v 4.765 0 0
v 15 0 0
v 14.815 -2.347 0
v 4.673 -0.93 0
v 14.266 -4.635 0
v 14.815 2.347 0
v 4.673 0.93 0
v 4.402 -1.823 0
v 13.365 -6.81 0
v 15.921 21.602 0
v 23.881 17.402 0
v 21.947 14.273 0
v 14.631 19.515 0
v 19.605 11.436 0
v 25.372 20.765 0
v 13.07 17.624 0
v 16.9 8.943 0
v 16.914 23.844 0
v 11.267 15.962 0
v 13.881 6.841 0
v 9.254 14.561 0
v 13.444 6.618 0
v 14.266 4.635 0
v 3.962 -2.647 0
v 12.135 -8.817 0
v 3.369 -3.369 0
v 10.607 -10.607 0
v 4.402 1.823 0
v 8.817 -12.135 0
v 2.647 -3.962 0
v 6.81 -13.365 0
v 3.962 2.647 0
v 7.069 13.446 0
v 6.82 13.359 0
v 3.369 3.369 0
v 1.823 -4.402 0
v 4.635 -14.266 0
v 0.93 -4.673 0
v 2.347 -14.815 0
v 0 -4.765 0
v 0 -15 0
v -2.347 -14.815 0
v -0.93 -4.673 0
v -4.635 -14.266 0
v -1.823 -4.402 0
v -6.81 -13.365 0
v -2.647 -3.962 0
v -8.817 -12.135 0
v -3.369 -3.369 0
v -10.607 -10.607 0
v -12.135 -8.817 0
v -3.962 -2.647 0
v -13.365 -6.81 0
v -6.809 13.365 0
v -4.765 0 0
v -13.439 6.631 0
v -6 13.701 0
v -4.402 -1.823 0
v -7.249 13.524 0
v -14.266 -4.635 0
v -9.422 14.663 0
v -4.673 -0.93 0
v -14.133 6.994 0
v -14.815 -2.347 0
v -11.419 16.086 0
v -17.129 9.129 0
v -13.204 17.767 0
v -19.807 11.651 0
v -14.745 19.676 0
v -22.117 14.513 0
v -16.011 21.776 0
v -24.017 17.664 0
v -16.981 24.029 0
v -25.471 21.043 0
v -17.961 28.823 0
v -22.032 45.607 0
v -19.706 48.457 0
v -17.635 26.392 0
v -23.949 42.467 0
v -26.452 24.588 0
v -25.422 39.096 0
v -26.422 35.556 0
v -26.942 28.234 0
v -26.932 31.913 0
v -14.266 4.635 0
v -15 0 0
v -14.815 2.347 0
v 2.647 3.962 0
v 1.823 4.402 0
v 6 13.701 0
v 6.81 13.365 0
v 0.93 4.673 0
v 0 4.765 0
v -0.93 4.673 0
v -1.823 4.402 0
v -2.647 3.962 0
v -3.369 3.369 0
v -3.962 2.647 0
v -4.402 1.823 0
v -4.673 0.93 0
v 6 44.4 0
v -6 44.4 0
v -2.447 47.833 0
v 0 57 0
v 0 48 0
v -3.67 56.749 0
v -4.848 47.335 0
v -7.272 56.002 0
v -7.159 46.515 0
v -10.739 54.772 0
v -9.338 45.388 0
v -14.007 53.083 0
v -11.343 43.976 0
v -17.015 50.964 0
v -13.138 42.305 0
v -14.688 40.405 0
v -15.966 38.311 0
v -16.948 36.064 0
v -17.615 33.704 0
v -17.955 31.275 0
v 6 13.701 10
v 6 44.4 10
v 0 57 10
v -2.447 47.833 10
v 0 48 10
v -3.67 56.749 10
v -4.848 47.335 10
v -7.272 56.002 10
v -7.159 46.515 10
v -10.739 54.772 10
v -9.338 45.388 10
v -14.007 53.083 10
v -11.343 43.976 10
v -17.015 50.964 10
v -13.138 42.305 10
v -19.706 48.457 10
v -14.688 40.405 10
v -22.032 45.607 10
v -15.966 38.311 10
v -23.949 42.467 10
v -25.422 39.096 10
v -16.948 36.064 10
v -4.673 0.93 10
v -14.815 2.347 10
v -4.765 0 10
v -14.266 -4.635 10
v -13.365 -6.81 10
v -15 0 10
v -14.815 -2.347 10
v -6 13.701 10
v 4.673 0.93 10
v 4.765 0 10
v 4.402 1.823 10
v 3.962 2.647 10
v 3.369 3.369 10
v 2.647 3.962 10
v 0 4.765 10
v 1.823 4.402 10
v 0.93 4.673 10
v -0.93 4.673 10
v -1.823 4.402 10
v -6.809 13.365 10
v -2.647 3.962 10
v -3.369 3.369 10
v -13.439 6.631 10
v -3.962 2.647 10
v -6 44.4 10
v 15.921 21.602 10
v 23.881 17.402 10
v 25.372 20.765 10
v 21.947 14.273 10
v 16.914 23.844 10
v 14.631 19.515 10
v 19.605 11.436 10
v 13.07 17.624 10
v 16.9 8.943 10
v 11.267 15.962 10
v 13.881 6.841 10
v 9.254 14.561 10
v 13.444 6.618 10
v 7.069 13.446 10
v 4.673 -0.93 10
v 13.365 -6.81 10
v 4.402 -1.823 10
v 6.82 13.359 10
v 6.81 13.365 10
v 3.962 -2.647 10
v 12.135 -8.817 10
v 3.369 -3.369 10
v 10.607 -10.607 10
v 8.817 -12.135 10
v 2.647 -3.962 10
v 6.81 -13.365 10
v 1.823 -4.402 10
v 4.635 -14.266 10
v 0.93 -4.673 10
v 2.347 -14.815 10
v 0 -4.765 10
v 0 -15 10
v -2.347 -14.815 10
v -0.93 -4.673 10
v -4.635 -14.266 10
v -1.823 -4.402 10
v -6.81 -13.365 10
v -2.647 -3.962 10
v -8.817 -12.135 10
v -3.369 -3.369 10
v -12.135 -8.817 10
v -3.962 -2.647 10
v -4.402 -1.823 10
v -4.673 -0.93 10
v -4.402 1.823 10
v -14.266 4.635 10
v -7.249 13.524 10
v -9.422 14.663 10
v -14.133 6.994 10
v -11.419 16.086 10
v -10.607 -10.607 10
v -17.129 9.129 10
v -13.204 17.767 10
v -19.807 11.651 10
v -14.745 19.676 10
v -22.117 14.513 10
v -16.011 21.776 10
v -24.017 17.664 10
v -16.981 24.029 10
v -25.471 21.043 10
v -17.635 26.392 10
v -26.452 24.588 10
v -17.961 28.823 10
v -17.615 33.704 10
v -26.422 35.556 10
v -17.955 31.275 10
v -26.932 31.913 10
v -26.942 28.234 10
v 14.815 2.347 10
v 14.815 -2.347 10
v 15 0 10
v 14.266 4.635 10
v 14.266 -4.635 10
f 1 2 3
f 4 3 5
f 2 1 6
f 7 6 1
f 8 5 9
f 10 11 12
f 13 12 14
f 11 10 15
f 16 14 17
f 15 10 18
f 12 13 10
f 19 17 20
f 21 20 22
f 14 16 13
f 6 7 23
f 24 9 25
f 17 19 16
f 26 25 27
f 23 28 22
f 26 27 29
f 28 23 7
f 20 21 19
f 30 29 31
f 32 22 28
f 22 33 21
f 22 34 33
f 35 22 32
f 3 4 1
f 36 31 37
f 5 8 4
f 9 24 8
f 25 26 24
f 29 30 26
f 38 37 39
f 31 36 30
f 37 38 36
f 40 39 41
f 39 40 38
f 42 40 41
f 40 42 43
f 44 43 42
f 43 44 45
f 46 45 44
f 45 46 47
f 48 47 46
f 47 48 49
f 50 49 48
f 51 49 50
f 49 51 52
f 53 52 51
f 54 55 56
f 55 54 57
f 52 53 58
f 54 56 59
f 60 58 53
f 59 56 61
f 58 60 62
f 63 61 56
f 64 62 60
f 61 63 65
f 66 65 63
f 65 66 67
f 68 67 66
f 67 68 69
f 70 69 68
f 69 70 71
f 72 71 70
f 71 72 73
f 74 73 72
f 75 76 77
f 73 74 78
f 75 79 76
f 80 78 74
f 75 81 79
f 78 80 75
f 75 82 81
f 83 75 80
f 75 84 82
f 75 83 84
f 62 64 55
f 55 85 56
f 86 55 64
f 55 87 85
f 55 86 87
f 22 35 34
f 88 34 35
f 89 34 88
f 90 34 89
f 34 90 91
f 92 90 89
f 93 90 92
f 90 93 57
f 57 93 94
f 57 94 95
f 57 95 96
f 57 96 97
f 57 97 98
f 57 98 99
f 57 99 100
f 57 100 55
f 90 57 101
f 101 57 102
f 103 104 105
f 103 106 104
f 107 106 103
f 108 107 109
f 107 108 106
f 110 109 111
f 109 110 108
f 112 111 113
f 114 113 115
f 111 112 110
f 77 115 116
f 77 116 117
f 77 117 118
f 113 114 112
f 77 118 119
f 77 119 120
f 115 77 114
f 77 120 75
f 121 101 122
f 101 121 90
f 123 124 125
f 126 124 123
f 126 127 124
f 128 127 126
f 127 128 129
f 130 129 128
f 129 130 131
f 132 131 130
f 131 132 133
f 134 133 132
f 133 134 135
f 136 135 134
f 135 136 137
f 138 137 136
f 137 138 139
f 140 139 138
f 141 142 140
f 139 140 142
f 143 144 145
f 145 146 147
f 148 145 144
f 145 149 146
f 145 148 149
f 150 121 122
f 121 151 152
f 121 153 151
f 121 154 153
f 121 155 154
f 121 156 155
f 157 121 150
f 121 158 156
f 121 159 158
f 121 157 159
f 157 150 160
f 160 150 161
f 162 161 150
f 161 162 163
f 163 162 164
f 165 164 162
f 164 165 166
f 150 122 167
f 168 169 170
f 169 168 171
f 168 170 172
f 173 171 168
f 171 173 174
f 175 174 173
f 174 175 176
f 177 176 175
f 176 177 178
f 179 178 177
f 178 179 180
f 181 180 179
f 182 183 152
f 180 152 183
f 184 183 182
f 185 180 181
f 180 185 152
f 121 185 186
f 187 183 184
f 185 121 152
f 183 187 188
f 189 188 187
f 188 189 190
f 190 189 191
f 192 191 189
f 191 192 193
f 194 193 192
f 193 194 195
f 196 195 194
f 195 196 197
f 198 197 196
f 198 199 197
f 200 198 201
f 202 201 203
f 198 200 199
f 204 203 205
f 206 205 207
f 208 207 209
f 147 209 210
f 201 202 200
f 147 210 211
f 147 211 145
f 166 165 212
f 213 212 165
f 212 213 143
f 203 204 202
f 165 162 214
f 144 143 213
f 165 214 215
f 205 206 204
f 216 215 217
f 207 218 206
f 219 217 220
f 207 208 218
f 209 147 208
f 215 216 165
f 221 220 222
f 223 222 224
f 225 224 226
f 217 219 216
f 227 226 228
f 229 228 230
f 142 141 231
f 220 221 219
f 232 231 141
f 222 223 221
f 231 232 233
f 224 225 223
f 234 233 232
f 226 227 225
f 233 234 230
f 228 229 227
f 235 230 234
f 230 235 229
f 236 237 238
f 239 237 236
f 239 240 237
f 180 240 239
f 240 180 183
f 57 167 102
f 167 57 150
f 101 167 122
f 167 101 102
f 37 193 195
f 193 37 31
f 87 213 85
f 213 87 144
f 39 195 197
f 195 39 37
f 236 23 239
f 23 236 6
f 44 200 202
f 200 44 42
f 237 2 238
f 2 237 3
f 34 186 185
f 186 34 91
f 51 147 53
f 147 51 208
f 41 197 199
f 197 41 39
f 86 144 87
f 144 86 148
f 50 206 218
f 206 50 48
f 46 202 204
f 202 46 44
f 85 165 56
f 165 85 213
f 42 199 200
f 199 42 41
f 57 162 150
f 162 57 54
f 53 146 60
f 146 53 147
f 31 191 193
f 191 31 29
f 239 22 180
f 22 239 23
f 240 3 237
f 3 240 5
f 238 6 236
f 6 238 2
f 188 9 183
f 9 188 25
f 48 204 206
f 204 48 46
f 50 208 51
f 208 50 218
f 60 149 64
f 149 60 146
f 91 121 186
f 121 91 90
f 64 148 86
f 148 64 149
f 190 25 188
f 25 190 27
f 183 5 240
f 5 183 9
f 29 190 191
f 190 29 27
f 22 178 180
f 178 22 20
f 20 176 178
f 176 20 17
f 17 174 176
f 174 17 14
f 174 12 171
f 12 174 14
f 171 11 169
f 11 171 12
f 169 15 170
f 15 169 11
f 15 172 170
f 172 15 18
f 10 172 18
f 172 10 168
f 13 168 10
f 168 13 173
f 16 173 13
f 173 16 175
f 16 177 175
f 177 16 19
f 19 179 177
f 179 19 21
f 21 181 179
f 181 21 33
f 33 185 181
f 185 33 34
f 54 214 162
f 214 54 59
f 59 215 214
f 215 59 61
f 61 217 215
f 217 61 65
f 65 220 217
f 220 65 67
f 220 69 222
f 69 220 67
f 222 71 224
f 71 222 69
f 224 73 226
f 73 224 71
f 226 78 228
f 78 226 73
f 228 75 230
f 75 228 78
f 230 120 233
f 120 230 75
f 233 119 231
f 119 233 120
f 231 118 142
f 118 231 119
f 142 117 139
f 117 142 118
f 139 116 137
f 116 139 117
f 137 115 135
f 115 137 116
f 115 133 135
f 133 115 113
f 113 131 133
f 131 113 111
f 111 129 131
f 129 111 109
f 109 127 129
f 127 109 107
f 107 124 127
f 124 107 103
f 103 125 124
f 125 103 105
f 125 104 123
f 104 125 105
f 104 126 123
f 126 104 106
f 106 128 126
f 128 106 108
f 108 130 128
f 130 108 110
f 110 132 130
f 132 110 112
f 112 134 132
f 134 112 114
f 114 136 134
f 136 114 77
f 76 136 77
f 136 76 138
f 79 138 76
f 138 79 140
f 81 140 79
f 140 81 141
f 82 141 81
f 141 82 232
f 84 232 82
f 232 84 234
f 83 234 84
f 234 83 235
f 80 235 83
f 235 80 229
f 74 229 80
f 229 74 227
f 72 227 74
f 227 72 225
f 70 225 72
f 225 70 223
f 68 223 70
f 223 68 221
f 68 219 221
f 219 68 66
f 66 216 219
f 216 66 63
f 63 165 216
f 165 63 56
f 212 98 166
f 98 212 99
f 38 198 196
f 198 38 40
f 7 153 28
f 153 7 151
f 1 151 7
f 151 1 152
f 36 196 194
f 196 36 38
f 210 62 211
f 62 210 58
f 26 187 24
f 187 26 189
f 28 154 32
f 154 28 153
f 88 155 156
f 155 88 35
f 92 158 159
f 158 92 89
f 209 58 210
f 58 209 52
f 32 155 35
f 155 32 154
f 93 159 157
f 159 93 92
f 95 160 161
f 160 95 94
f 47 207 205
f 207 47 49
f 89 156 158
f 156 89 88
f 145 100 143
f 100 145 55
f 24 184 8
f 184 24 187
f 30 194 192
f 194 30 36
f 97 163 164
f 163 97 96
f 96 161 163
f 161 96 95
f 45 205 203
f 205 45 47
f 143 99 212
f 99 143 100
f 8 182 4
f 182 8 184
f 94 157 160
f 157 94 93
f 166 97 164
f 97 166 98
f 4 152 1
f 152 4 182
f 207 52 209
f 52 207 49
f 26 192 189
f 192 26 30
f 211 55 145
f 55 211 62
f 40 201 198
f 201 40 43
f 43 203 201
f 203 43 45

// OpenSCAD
$fn = 32;

// ----------------------------------------------------------------------
// Hook: 60 mm shank into a 18 mm curl, 10 mm thick
// ----------------------------------------------------------------------

// --- parameters (mm) ---
shank_len = 60;           // shank length from the boss centre
shank_w = 12;             // shank width
boss_d = 30;              // boss diameter
bore_d = 9.53;            // boss bore
curl_in = 18;             // curl inner radius
curl_out = 27;            // curl outer radius
curl_sweep = 250;         // curl sweep angle
hook_t = 10;              // hook thickness

shank_profile = [[-6, 44.4], [6, 44.4], [6, 13], [-6, 13]];
boss_profile = [[15, 0], [14.815, 2.347], [14.266, 4.635], [13.365, 6.81], [12.135, 8.817], [10.607, 10.607], [8.817, 12.135], [6.81, 13.365], [4.635, 14.266], [2.347, 14.815], [0, 15], [-2.347, 14.815], [-4.635, 14.266], [-6.81, 13.365], [-8.817, 12.135], [-10.607, 10.607], [-12.135, 8.817], [-13.365, 6.81], [-14.266, 4.635], [-14.815, 2.347], [-15, 0], [-14.815, -2.347], [-14.266, -4.635], [-13.365, -6.81], [-12.135, -8.817], [-10.607, -10.607], [-8.817, -12.135], [-6.81, -13.365], [-4.635, -14.266], [-2.347, -14.815], [0, -15], [2.347, -14.815], [4.635, -14.266], [6.81, -13.365], [8.817, -12.135], [10.607, -10.607], [12.135, -8.817], [13.365, -6.81], [14.266, -4.635], [14.815, -2.347]];
curl_profile = [[0, 57], [-3.67, 56.749], [-7.272, 56.002], [-10.739, 54.772], [-14.007, 53.083], [-17.015, 50.964], [-19.706, 48.457], [-22.032, 45.607], [-23.949, 42.467], [-25.422, 39.096], [-26.422, 35.556], [-26.932, 31.913], [-26.942, 28.234], [-26.452, 24.588], [-25.471, 21.043], [-24.017, 17.664], [-22.117, 14.513], [-19.807, 11.651], [-17.129, 9.129], [-14.133, 6.994], [-10.874, 5.287], [-7.414, 4.038], [-3.816, 3.271], [-0.147, 3], [3.524, 3.231], [7.13, 3.959], [10.604, 5.169], [13.881, 6.841], [16.9, 8.943], [19.605, 11.436], [21.947, 14.273], [23.881, 17.402], [25.372, 20.765], [16.914, 23.844], [15.921, 21.602], [14.631, 19.515], [13.07, 17.624], [11.267, 15.962], [9.254, 14.561], [7.069, 13.446], [4.754, 12.639], [2.349, 12.154], [-0.098, 12], [-2.544, 12.181], [-4.943, 12.692], [-7.249, 13.524], [-9.422, 14.663], [-11.419, 16.086], [-13.204, 17.767], [-14.745, 19.676], [-16.011, 21.776], [-16.981, 24.029], [-17.635, 26.392], [-17.961, 28.823], [-17.955, 31.275], [-17.615, 33.704], [-16.948, 36.064], [-15.966, 38.311], [-14.688, 40.405], [-13.138, 42.305], [-11.343, 43.976], [-9.338, 45.388], [-7.159, 46.515], [-4.848, 47.335], [-2.447, 47.833], [0, 48]];

difference() {
  union() {
    /* three overlapping outlines: shank, boss and the smooth curl */
    linear_extrude(height = hook_t) polygon(shank_profile);
    linear_extrude(height = hook_t) polygon(boss_profile);
    linear_extrude(height = hook_t) polygon(curl_profile);
  }
  translate([0, 0, -2.5]) cylinder(h = hook_t + 5, d = bore_d);
}
